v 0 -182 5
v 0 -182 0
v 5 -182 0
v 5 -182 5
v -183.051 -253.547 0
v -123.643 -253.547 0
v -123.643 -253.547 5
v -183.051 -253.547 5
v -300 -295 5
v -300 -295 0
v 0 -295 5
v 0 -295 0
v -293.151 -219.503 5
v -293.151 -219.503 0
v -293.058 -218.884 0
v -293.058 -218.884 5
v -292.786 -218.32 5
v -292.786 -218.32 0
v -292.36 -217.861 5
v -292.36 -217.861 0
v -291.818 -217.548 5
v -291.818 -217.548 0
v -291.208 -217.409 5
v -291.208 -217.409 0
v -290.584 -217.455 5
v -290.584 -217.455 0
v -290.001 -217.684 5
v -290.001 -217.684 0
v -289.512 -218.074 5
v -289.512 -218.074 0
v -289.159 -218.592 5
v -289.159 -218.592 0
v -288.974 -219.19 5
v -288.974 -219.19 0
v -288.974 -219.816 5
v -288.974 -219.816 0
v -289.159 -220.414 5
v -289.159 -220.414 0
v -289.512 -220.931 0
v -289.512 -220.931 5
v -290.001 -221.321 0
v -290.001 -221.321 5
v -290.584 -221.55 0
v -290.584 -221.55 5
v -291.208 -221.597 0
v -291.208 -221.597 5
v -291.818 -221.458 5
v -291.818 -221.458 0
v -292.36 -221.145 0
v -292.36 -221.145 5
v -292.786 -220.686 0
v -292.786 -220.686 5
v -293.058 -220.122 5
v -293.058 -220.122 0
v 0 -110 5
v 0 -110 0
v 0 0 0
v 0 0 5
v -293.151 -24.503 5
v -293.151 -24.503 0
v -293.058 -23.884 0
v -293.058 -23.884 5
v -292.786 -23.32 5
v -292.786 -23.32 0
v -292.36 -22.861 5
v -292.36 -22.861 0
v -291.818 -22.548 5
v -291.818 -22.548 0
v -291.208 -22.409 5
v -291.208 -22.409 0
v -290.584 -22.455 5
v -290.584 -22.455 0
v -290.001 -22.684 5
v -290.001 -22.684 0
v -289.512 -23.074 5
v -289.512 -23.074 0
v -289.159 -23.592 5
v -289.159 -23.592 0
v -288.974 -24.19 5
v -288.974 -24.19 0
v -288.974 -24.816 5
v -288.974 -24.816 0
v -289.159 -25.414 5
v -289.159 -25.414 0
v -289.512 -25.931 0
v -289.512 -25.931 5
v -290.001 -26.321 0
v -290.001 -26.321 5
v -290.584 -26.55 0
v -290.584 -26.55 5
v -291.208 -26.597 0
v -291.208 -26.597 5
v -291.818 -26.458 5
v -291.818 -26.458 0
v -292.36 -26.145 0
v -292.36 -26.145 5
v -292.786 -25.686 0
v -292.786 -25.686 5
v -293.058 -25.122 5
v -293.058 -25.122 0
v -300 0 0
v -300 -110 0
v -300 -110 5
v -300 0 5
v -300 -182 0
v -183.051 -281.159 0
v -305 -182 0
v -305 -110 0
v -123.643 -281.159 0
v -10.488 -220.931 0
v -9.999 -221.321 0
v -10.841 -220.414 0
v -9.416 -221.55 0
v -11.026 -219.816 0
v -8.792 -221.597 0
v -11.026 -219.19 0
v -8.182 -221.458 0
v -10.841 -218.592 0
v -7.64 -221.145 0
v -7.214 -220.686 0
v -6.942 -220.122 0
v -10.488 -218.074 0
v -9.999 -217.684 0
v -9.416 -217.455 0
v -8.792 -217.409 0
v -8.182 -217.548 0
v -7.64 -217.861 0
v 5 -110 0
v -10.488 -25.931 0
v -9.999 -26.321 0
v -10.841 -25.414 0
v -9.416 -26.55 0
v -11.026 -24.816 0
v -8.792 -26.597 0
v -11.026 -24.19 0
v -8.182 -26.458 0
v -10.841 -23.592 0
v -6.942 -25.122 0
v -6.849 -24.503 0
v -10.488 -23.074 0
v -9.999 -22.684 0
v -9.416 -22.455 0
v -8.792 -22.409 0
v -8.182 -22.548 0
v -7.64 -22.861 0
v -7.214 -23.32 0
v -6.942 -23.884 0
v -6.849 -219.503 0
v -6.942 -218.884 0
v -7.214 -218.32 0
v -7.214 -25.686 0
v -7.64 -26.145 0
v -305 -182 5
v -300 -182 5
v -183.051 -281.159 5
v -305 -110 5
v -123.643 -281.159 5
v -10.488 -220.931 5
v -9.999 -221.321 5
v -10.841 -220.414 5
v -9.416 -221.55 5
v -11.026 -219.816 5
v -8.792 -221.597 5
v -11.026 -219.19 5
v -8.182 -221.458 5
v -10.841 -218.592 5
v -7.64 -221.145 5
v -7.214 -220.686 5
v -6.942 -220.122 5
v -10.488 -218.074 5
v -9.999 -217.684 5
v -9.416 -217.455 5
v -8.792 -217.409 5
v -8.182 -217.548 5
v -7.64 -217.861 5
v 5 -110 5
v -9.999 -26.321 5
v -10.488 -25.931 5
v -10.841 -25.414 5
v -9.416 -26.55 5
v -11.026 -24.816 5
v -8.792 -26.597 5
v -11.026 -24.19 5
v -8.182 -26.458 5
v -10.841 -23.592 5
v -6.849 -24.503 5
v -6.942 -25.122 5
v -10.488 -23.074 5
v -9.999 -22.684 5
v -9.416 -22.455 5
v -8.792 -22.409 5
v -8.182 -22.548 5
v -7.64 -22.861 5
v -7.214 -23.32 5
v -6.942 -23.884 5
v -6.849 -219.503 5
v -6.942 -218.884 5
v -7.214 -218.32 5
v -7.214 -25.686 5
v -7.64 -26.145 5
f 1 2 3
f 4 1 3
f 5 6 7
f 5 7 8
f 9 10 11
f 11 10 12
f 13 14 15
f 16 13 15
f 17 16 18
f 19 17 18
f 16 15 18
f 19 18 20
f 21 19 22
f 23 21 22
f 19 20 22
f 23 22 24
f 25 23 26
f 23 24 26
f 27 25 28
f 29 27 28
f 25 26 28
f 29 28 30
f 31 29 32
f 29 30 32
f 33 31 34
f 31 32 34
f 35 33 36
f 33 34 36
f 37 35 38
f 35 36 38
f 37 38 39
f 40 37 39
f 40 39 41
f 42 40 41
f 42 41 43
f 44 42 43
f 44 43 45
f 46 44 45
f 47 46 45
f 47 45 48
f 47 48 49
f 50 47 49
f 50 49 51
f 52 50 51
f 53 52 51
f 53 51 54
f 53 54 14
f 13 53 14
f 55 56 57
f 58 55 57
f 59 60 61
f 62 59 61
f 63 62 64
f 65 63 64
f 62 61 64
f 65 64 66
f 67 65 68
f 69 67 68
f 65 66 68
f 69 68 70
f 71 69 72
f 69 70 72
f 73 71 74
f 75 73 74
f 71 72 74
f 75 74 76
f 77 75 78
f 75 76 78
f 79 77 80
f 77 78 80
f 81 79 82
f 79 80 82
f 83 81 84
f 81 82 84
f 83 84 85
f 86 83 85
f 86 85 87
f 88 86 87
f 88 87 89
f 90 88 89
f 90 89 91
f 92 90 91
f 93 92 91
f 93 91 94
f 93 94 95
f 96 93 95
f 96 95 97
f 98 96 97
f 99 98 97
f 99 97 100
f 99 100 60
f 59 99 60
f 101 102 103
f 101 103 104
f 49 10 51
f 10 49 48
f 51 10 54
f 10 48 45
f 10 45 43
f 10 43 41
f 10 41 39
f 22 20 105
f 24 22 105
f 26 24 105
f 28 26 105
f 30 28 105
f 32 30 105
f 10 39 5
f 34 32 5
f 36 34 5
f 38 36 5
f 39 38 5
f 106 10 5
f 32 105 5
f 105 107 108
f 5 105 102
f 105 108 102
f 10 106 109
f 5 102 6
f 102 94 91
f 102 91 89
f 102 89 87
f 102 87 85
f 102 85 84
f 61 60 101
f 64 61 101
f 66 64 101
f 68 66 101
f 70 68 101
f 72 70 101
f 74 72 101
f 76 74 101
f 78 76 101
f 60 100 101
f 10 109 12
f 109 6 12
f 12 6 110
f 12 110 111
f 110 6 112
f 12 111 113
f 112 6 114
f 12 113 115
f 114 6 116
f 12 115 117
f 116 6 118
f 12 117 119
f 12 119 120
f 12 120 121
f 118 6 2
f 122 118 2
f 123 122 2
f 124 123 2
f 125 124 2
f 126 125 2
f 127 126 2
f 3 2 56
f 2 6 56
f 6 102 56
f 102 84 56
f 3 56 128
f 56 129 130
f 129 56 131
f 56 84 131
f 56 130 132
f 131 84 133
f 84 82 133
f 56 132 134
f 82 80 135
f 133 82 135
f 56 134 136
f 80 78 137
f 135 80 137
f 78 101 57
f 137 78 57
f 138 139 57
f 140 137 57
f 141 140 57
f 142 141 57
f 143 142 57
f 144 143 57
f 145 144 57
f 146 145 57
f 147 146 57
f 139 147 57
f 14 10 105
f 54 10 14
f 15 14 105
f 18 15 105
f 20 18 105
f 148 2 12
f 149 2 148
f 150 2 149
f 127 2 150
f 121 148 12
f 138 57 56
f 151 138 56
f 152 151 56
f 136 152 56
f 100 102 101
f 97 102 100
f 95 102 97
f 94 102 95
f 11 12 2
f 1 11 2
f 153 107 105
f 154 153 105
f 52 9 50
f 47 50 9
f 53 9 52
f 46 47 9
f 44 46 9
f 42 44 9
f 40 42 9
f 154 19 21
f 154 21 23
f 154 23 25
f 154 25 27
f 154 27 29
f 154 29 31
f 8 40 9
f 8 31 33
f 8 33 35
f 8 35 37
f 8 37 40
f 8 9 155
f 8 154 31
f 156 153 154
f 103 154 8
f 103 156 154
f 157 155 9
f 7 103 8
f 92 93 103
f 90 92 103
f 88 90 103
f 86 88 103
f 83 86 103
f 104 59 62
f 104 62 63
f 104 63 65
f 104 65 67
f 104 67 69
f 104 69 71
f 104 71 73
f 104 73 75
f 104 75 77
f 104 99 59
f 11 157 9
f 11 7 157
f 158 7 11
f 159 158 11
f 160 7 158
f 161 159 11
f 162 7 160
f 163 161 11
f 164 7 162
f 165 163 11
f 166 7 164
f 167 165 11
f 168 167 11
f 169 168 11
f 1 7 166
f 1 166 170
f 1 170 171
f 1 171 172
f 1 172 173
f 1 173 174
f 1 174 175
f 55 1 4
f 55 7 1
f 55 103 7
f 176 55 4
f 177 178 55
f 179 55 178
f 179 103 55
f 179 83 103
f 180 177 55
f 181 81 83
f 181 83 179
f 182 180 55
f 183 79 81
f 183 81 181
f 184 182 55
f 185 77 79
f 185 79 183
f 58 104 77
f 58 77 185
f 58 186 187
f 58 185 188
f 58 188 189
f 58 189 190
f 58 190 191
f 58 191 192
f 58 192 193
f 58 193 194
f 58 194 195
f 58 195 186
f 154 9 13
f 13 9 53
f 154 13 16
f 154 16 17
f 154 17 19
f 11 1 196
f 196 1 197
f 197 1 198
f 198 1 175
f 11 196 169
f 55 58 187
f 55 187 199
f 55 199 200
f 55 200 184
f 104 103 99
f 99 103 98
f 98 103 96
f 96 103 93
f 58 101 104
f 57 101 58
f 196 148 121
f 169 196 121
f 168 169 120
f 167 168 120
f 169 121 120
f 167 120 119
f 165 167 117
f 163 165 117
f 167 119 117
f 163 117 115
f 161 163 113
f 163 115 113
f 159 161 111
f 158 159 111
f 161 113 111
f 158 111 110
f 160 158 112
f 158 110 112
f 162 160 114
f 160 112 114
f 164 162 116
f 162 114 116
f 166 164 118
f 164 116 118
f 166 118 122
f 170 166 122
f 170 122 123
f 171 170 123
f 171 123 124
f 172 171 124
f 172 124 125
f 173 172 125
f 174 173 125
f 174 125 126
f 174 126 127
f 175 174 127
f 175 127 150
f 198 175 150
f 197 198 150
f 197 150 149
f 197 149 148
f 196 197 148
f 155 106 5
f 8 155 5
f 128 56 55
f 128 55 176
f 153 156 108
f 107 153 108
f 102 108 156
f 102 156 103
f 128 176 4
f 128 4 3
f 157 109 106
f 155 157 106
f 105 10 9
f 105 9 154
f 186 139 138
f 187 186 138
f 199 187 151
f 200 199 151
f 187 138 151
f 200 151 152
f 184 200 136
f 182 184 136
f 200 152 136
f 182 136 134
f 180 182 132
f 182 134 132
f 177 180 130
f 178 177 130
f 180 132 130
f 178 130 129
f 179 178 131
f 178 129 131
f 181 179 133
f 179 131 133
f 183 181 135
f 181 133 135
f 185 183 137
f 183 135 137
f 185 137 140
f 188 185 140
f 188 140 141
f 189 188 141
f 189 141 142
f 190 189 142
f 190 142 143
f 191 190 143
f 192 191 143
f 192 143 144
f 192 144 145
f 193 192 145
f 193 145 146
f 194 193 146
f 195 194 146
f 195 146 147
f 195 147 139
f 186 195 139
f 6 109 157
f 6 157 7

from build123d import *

# Parameters (mm, degrees)
ESQUISSE1_W                        = 300
ESQUISSE1_H                        = 295
BOSS_EXTRU_1_DEPTH                 = 5
TENON_START                        = -182
TENON_ET_MORTAISE_TENON1_OUTLINE_W = 5
TENON_ET_MORTAISE_TENON1_OUTLINE_H = 5
TENON_ET_MORTAISE_TENON1_DEPTH     = 72
TENON_ET_MORTAISE_TENON2_OUTLINE_W = 5
TENON_ET_MORTAISE_TENON2_OUTLINE_H = 5
TENON_ET_MORTAISE_TENON2_DEPTH     = 72
ESQUISSE2_W                        = 59.408594242
ESQUISSE2_H                        = 27.612445211
ENL_V_MAT_EXTRU_2_DEPTH            = 10
ESQUISSE3_R                        = 2.100000001
ENL_V_MAT_EXTRU_3_DEPTH            = 425.352447854
ESQUISSE4_R                        = 2.1
ENL_V_MAT_EXTRU_4_DEPTH            = 425.352447854
ESQUISSE5_R                        = 2.1
ENL_V_MAT_EXTRU_5_DEPTH            = 425.352447854


# Read off the part's stored shape, not the designer's step: Tenon et mortaise-Tenon1, Tenon et mortaise-Tenon2
with BuildPart() as part:
    # Esquisse1 → Boss.-Extru.1 (new body)
    with BuildSketch(Plane.XY):
        with Locations((-150, -147.5)):
            Rectangle(ESQUISSE1_W, ESQUISSE1_H)
    extrude(amount=BOSS_EXTRU_1_DEPTH)

    # Tenon et mortaise-Tenon1 outline → Tenon et mortaise-Tenon1 (add)
    with BuildSketch(Plane(origin=(0, 0, 0), x_dir=(1, 0, 0), z_dir=(0, 1, 0)).offset(TENON_START)):
        with Locations((2.5, -2.5)):
            Rectangle(TENON_ET_MORTAISE_TENON1_OUTLINE_W, TENON_ET_MORTAISE_TENON1_OUTLINE_H)
    extrude(amount=TENON_ET_MORTAISE_TENON1_DEPTH)

    # Tenon et mortaise-Tenon2 outline → Tenon et mortaise-Tenon2 (add)
    with BuildSketch(Plane(origin=(0, 0, 0), x_dir=(1, 0, 0), z_dir=(0, 1, 0)).offset(TENON_START)):
        with Locations((-302.5, -2.5)):
            Rectangle(TENON_ET_MORTAISE_TENON2_OUTLINE_W, TENON_ET_MORTAISE_TENON2_OUTLINE_H)
    extrude(amount=TENON_ET_MORTAISE_TENON2_DEPTH)

    # Esquisse2 → Enlèv. mat.-Extru.2 (cut)
    with BuildSketch(Plane(origin=(0, 0, 0), x_dir=(-1, 0, 0), z_dir=(0, 0, -1))):
        with Locations((153.346963056, -267.352892149)):
            Rectangle(ESQUISSE2_W, ESQUISSE2_H)
    extrude(amount=-ENL_V_MAT_EXTRU_2_DEPTH, mode=Mode.SUBTRACT)

    # Esquisse3 → Enlèv. mat.-Extru.3 (cut, through all)
    with BuildSketch(Plane(origin=(0, 0, 0), x_dir=(-1, 0, 0), z_dir=(0, 0, -1))):
        with Locations((291.051040249, -219.502837044)):
            Circle(ESQUISSE3_R)
        with Locations(Location((8.948959751, -219.502837044, 0), (0, 0, 180))):
            Circle(ESQUISSE3_R)
    extrude(amount=-ENL_V_MAT_EXTRU_3_DEPTH, mode=Mode.SUBTRACT)

    # Esquisse4 → Enlèv. mat.-Extru.4 (cut, through all)
    with BuildSketch(Plane(origin=(0, 0, 0), x_dir=(-1, 0, 0), z_dir=(0, 0, -1))):
        with Locations((291.051040249, -24.502837044)):
            Circle(ESQUISSE4_R)
    extrude(amount=-ENL_V_MAT_EXTRU_4_DEPTH, mode=Mode.SUBTRACT)

    # Esquisse5 → Enlèv. mat.-Extru.5 (cut, through all)
    with BuildSketch(Plane(origin=(0, 0, 0), x_dir=(-1, 0, 0), z_dir=(0, 0, -1))):
        with Locations((291.051040249, -24.502837044)):
            Circle(ESQUISSE5_R)
        with Locations(Location((8.948959751, -24.502837044, 0), (0, 0, 180))):
            Circle(ESQUISSE5_R)
    extrude(amount=-ENL_V_MAT_EXTRU_5_DEPTH, mode=Mode.SUBTRACT)


solid = part.part
